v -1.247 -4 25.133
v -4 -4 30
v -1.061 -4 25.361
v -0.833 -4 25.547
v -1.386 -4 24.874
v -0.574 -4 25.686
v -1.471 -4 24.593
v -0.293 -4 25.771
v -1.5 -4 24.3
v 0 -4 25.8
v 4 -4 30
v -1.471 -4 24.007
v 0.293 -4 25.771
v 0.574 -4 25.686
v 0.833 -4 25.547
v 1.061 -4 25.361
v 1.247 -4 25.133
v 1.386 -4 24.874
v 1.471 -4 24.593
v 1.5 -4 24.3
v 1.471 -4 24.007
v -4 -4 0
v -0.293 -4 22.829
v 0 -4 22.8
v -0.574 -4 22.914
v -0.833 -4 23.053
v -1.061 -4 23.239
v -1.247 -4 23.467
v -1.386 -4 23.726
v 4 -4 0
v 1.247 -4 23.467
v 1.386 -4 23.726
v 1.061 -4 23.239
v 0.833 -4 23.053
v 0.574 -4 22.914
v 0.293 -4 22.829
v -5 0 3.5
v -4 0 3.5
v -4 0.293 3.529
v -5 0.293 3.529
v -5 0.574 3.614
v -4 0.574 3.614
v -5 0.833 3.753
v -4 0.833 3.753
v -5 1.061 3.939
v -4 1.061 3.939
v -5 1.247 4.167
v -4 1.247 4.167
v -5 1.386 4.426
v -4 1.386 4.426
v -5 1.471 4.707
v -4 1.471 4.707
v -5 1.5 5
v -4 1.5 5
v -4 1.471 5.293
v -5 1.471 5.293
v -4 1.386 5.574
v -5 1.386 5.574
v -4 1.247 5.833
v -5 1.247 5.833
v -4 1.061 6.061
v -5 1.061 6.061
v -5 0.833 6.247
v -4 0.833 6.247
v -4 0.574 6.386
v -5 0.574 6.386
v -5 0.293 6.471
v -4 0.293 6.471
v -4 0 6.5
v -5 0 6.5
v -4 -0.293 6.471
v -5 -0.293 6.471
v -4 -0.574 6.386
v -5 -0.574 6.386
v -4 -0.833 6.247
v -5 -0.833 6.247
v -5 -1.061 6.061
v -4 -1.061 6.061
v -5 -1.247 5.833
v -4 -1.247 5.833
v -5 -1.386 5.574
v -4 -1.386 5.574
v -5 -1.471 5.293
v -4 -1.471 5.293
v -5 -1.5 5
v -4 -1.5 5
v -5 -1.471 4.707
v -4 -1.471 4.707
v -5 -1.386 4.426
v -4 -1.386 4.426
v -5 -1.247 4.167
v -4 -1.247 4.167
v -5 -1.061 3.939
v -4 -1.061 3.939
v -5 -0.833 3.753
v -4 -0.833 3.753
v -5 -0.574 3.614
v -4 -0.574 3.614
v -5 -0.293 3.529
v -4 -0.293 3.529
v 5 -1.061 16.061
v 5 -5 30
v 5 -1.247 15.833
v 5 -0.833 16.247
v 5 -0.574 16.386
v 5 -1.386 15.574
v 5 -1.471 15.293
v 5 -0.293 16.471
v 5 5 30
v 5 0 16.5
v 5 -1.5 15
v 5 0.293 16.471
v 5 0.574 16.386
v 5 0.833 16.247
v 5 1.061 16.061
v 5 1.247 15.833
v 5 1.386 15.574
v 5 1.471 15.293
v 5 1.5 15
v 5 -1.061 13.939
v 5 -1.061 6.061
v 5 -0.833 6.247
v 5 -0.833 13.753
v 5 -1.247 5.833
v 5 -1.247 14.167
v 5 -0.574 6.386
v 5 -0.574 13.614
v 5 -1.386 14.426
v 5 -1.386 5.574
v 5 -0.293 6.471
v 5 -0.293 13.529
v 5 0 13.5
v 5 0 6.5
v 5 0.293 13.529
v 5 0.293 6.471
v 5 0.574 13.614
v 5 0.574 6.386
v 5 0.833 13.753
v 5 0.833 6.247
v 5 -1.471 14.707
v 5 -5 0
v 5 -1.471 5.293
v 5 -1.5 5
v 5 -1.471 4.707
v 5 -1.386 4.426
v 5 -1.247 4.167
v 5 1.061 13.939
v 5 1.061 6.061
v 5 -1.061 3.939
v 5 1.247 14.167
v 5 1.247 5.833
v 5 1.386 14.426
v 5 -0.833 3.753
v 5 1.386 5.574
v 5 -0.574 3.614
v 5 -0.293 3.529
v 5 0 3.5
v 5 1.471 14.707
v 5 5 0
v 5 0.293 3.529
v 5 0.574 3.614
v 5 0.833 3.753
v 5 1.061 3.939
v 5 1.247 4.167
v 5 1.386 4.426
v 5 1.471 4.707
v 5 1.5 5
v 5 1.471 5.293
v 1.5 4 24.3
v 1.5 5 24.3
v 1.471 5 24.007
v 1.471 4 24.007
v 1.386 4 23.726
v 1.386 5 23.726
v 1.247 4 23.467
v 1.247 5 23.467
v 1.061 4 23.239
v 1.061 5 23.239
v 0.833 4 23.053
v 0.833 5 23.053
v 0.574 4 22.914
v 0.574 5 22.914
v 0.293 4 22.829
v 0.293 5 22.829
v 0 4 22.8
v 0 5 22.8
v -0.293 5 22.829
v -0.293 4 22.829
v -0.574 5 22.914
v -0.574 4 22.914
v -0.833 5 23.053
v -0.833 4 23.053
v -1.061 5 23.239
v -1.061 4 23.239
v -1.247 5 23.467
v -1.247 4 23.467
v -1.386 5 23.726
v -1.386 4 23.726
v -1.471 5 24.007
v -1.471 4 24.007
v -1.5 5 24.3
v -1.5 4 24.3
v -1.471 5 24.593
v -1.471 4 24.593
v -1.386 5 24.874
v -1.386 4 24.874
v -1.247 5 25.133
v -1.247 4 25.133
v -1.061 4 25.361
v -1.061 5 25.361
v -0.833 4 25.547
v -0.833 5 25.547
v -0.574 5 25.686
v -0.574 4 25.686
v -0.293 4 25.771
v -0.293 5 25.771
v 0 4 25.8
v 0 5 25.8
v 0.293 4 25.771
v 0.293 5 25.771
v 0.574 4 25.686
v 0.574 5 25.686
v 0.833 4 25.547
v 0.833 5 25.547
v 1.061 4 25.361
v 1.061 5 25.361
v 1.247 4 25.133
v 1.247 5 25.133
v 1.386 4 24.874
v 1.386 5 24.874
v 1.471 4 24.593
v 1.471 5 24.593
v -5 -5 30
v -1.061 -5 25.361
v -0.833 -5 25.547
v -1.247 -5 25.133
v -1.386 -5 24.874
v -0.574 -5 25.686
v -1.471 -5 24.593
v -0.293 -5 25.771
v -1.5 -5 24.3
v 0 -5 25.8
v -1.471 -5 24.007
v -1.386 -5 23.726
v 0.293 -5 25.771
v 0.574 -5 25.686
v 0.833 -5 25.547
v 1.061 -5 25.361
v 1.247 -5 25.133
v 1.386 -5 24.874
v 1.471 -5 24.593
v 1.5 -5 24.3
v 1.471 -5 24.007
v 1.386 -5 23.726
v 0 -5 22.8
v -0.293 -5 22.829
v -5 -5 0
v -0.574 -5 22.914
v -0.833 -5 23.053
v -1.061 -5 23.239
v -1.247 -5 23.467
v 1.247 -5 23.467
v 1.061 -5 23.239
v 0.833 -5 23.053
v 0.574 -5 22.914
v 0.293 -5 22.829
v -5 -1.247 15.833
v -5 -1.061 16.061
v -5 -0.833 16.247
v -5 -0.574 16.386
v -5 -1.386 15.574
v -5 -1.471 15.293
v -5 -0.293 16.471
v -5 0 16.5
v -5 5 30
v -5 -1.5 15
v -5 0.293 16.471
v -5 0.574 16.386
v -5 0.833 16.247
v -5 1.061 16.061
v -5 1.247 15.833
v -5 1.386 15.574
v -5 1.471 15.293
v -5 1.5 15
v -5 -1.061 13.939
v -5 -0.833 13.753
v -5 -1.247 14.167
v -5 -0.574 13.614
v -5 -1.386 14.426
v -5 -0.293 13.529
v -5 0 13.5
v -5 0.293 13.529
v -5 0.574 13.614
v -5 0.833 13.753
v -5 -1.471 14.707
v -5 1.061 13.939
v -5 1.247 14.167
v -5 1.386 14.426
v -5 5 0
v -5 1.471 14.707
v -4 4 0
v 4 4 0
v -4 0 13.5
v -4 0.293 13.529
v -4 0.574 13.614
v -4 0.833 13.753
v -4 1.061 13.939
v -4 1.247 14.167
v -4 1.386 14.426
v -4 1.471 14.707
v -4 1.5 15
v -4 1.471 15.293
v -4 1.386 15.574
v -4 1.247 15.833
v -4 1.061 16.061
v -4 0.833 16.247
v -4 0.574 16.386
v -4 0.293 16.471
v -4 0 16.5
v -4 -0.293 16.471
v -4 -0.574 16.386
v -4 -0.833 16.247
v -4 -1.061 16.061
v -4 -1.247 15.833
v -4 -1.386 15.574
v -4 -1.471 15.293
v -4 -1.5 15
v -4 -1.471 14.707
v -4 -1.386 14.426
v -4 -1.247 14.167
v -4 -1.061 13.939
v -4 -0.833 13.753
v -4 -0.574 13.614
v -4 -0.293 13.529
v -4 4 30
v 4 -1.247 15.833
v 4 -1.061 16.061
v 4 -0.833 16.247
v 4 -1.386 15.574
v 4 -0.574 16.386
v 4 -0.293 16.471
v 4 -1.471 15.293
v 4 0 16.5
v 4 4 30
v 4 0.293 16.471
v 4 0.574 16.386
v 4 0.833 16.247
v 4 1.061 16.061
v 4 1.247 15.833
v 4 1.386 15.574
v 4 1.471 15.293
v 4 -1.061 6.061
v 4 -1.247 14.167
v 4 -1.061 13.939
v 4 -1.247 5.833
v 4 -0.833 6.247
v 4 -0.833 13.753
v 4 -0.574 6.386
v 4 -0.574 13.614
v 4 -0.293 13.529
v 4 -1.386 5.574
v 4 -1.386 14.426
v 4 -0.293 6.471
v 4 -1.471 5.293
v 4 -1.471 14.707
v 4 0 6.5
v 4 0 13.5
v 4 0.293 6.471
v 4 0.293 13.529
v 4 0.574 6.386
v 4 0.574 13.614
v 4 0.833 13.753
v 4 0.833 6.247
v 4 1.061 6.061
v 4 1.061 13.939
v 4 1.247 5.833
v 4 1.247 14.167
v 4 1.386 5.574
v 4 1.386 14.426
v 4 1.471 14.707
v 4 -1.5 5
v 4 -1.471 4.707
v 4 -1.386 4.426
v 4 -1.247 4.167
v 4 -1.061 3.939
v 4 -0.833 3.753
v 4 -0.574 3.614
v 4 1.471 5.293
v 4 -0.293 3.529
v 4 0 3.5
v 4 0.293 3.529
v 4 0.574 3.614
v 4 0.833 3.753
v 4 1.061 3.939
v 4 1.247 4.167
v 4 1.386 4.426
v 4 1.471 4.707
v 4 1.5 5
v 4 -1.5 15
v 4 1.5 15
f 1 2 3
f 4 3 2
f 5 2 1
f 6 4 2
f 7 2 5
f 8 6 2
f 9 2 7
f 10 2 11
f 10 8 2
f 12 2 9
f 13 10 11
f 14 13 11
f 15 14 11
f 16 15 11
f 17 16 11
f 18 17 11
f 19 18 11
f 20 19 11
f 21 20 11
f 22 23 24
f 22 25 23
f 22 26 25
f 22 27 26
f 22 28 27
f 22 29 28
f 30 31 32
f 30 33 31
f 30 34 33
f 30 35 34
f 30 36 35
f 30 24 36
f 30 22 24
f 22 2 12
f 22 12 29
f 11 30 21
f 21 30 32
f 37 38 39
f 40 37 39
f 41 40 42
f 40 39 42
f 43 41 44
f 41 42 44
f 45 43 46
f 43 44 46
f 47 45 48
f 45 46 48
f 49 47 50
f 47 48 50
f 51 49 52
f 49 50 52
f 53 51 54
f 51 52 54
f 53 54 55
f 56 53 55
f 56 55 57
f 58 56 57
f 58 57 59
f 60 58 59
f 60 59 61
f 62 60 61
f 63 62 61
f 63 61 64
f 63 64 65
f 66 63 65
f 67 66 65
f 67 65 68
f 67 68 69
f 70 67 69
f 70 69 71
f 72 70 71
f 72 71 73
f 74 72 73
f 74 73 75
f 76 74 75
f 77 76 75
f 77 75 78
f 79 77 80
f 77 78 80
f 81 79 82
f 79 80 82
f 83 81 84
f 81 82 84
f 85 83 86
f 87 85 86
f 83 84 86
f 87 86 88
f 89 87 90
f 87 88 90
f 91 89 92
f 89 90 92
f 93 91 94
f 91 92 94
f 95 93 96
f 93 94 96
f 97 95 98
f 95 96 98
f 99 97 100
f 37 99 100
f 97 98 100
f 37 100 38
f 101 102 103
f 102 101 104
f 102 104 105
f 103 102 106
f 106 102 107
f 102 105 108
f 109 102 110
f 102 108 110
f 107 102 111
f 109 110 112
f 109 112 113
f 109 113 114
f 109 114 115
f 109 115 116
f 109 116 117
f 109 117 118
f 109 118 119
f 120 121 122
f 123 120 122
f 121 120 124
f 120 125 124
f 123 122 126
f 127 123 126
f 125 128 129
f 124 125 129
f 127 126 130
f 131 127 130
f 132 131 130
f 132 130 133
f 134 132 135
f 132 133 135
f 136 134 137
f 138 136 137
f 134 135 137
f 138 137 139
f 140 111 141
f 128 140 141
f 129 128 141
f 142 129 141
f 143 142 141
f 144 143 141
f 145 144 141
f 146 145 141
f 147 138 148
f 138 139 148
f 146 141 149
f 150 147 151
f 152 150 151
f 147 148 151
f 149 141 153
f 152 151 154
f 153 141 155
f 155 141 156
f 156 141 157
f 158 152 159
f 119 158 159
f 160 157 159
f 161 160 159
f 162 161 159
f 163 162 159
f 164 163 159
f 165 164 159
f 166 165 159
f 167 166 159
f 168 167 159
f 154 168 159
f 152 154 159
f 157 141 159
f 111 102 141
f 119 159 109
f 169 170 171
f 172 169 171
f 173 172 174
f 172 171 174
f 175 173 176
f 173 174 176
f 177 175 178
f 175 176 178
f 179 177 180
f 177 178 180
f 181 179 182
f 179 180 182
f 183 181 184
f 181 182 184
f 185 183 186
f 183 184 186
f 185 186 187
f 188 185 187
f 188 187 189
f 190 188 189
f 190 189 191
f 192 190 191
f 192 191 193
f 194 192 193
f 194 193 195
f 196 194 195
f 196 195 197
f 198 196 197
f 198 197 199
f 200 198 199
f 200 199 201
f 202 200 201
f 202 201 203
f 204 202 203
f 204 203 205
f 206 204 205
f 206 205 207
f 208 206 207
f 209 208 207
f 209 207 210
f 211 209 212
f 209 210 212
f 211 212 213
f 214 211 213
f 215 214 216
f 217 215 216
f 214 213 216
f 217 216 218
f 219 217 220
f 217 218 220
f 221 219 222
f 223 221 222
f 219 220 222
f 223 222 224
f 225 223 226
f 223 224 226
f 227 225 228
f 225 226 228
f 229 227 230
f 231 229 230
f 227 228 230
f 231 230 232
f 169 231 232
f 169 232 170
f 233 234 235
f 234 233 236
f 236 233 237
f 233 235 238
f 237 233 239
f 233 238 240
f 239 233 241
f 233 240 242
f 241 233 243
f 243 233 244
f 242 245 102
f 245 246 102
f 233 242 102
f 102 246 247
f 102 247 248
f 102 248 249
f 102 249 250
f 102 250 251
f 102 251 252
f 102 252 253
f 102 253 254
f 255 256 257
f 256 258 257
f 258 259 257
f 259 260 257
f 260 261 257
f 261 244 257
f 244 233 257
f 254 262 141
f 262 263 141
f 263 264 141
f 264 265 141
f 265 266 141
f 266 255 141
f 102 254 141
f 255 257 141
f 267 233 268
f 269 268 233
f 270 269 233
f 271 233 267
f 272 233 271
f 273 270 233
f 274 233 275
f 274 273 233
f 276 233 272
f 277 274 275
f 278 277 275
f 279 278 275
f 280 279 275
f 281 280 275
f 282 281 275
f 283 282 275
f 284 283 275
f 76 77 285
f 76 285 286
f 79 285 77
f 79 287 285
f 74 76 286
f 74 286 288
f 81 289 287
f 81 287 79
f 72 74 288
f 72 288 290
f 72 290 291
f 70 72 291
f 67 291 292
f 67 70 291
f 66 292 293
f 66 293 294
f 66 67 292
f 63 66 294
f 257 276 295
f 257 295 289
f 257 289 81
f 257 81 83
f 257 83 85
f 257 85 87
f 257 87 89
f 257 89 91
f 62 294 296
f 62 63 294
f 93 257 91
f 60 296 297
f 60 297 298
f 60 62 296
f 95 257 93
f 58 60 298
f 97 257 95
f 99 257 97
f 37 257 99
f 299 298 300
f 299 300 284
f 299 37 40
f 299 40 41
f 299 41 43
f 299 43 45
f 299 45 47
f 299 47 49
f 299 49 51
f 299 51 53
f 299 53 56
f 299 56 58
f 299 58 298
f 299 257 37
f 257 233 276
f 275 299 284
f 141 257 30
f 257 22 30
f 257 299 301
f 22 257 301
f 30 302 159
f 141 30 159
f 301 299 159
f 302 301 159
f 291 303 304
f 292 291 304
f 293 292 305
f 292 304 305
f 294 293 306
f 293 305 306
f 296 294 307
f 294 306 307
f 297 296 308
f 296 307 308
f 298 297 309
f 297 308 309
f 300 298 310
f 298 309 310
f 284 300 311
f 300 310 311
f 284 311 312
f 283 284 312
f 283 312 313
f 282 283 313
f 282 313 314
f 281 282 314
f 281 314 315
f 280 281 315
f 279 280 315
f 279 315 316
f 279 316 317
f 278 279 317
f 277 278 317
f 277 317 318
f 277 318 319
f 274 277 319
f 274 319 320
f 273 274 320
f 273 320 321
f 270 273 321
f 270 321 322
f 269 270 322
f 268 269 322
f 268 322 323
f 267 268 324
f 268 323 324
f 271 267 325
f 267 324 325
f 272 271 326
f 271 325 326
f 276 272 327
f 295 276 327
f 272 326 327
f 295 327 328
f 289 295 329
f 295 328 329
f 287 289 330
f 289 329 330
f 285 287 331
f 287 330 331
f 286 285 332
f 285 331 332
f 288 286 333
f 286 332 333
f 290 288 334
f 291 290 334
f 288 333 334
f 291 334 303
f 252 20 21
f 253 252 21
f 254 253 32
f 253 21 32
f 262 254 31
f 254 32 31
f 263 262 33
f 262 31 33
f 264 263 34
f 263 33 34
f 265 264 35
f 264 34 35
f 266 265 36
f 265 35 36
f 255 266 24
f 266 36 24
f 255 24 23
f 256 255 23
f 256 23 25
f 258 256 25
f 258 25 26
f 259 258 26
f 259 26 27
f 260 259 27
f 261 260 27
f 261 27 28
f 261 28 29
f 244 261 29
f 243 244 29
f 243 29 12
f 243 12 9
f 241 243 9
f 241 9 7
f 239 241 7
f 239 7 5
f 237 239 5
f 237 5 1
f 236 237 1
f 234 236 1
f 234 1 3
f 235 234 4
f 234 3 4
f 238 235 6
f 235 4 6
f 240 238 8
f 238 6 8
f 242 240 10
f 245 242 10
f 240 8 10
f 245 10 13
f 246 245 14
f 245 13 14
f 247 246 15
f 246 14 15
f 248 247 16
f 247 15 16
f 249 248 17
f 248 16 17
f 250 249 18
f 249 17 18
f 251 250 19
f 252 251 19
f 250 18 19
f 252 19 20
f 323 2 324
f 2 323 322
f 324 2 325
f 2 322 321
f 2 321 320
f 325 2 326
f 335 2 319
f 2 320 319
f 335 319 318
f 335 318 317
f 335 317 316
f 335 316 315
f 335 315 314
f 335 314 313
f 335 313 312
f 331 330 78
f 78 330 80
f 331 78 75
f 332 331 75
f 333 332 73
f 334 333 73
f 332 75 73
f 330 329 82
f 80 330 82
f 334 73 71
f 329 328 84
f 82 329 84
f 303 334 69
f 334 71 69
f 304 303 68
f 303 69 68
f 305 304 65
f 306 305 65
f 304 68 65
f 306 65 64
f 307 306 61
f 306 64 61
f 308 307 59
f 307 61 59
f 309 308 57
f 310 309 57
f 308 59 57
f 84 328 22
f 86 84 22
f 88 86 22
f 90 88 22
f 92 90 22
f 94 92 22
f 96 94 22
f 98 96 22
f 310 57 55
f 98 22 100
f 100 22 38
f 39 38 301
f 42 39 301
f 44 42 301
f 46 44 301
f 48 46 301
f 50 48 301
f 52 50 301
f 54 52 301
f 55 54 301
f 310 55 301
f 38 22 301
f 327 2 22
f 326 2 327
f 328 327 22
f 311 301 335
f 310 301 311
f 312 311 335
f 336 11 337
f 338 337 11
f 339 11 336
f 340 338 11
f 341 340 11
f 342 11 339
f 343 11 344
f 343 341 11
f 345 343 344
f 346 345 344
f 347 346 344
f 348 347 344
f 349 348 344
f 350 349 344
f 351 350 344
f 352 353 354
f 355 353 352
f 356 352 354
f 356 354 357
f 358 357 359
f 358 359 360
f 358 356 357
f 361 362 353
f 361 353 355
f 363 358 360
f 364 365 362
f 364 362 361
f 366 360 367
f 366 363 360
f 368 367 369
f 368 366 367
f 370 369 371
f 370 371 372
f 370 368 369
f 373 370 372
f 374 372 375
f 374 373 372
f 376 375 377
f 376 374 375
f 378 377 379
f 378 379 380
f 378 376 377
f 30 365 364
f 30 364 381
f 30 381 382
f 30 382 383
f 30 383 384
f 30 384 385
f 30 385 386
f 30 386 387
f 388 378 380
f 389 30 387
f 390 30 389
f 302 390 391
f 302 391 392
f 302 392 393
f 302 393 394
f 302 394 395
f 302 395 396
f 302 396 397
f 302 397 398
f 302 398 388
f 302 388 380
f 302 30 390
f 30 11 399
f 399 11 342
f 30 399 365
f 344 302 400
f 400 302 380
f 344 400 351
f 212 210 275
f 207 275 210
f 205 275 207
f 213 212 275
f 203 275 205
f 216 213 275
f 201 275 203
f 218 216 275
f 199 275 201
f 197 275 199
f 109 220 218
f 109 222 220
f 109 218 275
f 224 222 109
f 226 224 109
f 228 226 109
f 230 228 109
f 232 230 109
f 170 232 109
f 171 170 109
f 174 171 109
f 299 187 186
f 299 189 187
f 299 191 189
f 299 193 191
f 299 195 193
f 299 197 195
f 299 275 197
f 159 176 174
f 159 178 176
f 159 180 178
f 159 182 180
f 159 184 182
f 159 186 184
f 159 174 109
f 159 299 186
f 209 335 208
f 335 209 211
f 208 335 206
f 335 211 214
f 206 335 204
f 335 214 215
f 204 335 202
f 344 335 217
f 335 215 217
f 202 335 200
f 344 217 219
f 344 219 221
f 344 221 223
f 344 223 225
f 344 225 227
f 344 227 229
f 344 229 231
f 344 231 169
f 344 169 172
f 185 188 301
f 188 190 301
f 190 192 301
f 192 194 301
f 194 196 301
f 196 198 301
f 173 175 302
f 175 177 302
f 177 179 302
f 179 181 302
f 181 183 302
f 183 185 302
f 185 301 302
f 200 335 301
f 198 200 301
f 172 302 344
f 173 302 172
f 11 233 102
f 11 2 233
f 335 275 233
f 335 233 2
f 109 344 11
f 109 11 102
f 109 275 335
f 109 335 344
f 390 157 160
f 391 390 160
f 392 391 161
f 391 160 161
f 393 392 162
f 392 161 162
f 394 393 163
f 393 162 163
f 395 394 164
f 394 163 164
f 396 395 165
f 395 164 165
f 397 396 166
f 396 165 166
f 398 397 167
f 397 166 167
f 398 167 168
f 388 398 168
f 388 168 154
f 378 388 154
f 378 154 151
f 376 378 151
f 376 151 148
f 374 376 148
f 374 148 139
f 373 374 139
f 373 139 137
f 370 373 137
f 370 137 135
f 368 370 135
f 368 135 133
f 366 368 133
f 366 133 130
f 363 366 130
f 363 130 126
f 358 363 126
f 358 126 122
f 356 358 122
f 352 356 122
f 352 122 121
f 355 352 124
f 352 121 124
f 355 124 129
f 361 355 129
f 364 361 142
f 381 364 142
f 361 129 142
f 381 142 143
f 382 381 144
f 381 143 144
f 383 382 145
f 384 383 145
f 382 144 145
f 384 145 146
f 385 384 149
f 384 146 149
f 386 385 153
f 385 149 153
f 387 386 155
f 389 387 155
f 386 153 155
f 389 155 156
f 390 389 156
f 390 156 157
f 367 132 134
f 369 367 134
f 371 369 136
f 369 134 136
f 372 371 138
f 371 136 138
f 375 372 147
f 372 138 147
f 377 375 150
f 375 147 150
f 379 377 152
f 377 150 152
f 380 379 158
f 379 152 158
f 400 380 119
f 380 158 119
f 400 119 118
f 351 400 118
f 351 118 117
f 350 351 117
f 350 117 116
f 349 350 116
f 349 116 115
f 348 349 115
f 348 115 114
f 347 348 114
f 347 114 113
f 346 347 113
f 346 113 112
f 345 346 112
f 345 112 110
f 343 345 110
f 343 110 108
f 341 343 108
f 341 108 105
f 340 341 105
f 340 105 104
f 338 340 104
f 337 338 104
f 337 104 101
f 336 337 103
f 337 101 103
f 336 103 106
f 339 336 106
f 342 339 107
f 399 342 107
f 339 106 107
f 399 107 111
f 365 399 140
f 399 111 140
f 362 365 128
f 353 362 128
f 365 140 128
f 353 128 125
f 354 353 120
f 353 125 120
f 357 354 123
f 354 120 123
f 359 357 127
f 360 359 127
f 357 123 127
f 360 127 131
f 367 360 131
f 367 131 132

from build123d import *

# Parameters (mm, degrees)
SKETCH_1_W          = 10
SKETCH_1_H          = 10
SKETCH_1_W_2        = 8
SKETCH_1_H_2        = 8
EXTRUDE_1_DEPTH     = 30
SKETCH_2_R          = 1.5
CUT_EXTRUDE_1_DEPTH = 11
SKETCH_3_R          = 1.5
CUT_EXTRUDE_2_DEPTH = 11


with BuildPart() as part:
    # 草图1 → 拉伸-薄壁1 (new body)
    with BuildSketch(Plane.XY):
        Rectangle(SKETCH_1_W, SKETCH_1_H)
        Rectangle(SKETCH_1_W_2, SKETCH_1_H_2, mode=Mode.SUBTRACT)
    extrude(amount=EXTRUDE_1_DEPTH)

    # 草图2 → 切除-拉伸1 (cut, through all)
    with BuildSketch(Plane(origin=(5, 0, 0), x_dir=(0, 0, -1), z_dir=(1, 0, 0))):
        with Locations((-5, 0)):
            Circle(SKETCH_2_R)
        with Locations((-15, 0)):
            Circle(SKETCH_2_R)
    extrude(amount=-CUT_EXTRUDE_1_DEPTH, mode=Mode.SUBTRACT)

    # 草图3 → 切除-拉伸2 (cut, through all)
    with BuildSketch(Plane(origin=(0, 5, 0), x_dir=(1, 0, 0), z_dir=(0, 1, 0))):
        with Locations((0, -24.3)):
            Circle(SKETCH_3_R)
    extrude(amount=-CUT_EXTRUDE_2_DEPTH, mode=Mode.SUBTRACT)


solid = part.part
